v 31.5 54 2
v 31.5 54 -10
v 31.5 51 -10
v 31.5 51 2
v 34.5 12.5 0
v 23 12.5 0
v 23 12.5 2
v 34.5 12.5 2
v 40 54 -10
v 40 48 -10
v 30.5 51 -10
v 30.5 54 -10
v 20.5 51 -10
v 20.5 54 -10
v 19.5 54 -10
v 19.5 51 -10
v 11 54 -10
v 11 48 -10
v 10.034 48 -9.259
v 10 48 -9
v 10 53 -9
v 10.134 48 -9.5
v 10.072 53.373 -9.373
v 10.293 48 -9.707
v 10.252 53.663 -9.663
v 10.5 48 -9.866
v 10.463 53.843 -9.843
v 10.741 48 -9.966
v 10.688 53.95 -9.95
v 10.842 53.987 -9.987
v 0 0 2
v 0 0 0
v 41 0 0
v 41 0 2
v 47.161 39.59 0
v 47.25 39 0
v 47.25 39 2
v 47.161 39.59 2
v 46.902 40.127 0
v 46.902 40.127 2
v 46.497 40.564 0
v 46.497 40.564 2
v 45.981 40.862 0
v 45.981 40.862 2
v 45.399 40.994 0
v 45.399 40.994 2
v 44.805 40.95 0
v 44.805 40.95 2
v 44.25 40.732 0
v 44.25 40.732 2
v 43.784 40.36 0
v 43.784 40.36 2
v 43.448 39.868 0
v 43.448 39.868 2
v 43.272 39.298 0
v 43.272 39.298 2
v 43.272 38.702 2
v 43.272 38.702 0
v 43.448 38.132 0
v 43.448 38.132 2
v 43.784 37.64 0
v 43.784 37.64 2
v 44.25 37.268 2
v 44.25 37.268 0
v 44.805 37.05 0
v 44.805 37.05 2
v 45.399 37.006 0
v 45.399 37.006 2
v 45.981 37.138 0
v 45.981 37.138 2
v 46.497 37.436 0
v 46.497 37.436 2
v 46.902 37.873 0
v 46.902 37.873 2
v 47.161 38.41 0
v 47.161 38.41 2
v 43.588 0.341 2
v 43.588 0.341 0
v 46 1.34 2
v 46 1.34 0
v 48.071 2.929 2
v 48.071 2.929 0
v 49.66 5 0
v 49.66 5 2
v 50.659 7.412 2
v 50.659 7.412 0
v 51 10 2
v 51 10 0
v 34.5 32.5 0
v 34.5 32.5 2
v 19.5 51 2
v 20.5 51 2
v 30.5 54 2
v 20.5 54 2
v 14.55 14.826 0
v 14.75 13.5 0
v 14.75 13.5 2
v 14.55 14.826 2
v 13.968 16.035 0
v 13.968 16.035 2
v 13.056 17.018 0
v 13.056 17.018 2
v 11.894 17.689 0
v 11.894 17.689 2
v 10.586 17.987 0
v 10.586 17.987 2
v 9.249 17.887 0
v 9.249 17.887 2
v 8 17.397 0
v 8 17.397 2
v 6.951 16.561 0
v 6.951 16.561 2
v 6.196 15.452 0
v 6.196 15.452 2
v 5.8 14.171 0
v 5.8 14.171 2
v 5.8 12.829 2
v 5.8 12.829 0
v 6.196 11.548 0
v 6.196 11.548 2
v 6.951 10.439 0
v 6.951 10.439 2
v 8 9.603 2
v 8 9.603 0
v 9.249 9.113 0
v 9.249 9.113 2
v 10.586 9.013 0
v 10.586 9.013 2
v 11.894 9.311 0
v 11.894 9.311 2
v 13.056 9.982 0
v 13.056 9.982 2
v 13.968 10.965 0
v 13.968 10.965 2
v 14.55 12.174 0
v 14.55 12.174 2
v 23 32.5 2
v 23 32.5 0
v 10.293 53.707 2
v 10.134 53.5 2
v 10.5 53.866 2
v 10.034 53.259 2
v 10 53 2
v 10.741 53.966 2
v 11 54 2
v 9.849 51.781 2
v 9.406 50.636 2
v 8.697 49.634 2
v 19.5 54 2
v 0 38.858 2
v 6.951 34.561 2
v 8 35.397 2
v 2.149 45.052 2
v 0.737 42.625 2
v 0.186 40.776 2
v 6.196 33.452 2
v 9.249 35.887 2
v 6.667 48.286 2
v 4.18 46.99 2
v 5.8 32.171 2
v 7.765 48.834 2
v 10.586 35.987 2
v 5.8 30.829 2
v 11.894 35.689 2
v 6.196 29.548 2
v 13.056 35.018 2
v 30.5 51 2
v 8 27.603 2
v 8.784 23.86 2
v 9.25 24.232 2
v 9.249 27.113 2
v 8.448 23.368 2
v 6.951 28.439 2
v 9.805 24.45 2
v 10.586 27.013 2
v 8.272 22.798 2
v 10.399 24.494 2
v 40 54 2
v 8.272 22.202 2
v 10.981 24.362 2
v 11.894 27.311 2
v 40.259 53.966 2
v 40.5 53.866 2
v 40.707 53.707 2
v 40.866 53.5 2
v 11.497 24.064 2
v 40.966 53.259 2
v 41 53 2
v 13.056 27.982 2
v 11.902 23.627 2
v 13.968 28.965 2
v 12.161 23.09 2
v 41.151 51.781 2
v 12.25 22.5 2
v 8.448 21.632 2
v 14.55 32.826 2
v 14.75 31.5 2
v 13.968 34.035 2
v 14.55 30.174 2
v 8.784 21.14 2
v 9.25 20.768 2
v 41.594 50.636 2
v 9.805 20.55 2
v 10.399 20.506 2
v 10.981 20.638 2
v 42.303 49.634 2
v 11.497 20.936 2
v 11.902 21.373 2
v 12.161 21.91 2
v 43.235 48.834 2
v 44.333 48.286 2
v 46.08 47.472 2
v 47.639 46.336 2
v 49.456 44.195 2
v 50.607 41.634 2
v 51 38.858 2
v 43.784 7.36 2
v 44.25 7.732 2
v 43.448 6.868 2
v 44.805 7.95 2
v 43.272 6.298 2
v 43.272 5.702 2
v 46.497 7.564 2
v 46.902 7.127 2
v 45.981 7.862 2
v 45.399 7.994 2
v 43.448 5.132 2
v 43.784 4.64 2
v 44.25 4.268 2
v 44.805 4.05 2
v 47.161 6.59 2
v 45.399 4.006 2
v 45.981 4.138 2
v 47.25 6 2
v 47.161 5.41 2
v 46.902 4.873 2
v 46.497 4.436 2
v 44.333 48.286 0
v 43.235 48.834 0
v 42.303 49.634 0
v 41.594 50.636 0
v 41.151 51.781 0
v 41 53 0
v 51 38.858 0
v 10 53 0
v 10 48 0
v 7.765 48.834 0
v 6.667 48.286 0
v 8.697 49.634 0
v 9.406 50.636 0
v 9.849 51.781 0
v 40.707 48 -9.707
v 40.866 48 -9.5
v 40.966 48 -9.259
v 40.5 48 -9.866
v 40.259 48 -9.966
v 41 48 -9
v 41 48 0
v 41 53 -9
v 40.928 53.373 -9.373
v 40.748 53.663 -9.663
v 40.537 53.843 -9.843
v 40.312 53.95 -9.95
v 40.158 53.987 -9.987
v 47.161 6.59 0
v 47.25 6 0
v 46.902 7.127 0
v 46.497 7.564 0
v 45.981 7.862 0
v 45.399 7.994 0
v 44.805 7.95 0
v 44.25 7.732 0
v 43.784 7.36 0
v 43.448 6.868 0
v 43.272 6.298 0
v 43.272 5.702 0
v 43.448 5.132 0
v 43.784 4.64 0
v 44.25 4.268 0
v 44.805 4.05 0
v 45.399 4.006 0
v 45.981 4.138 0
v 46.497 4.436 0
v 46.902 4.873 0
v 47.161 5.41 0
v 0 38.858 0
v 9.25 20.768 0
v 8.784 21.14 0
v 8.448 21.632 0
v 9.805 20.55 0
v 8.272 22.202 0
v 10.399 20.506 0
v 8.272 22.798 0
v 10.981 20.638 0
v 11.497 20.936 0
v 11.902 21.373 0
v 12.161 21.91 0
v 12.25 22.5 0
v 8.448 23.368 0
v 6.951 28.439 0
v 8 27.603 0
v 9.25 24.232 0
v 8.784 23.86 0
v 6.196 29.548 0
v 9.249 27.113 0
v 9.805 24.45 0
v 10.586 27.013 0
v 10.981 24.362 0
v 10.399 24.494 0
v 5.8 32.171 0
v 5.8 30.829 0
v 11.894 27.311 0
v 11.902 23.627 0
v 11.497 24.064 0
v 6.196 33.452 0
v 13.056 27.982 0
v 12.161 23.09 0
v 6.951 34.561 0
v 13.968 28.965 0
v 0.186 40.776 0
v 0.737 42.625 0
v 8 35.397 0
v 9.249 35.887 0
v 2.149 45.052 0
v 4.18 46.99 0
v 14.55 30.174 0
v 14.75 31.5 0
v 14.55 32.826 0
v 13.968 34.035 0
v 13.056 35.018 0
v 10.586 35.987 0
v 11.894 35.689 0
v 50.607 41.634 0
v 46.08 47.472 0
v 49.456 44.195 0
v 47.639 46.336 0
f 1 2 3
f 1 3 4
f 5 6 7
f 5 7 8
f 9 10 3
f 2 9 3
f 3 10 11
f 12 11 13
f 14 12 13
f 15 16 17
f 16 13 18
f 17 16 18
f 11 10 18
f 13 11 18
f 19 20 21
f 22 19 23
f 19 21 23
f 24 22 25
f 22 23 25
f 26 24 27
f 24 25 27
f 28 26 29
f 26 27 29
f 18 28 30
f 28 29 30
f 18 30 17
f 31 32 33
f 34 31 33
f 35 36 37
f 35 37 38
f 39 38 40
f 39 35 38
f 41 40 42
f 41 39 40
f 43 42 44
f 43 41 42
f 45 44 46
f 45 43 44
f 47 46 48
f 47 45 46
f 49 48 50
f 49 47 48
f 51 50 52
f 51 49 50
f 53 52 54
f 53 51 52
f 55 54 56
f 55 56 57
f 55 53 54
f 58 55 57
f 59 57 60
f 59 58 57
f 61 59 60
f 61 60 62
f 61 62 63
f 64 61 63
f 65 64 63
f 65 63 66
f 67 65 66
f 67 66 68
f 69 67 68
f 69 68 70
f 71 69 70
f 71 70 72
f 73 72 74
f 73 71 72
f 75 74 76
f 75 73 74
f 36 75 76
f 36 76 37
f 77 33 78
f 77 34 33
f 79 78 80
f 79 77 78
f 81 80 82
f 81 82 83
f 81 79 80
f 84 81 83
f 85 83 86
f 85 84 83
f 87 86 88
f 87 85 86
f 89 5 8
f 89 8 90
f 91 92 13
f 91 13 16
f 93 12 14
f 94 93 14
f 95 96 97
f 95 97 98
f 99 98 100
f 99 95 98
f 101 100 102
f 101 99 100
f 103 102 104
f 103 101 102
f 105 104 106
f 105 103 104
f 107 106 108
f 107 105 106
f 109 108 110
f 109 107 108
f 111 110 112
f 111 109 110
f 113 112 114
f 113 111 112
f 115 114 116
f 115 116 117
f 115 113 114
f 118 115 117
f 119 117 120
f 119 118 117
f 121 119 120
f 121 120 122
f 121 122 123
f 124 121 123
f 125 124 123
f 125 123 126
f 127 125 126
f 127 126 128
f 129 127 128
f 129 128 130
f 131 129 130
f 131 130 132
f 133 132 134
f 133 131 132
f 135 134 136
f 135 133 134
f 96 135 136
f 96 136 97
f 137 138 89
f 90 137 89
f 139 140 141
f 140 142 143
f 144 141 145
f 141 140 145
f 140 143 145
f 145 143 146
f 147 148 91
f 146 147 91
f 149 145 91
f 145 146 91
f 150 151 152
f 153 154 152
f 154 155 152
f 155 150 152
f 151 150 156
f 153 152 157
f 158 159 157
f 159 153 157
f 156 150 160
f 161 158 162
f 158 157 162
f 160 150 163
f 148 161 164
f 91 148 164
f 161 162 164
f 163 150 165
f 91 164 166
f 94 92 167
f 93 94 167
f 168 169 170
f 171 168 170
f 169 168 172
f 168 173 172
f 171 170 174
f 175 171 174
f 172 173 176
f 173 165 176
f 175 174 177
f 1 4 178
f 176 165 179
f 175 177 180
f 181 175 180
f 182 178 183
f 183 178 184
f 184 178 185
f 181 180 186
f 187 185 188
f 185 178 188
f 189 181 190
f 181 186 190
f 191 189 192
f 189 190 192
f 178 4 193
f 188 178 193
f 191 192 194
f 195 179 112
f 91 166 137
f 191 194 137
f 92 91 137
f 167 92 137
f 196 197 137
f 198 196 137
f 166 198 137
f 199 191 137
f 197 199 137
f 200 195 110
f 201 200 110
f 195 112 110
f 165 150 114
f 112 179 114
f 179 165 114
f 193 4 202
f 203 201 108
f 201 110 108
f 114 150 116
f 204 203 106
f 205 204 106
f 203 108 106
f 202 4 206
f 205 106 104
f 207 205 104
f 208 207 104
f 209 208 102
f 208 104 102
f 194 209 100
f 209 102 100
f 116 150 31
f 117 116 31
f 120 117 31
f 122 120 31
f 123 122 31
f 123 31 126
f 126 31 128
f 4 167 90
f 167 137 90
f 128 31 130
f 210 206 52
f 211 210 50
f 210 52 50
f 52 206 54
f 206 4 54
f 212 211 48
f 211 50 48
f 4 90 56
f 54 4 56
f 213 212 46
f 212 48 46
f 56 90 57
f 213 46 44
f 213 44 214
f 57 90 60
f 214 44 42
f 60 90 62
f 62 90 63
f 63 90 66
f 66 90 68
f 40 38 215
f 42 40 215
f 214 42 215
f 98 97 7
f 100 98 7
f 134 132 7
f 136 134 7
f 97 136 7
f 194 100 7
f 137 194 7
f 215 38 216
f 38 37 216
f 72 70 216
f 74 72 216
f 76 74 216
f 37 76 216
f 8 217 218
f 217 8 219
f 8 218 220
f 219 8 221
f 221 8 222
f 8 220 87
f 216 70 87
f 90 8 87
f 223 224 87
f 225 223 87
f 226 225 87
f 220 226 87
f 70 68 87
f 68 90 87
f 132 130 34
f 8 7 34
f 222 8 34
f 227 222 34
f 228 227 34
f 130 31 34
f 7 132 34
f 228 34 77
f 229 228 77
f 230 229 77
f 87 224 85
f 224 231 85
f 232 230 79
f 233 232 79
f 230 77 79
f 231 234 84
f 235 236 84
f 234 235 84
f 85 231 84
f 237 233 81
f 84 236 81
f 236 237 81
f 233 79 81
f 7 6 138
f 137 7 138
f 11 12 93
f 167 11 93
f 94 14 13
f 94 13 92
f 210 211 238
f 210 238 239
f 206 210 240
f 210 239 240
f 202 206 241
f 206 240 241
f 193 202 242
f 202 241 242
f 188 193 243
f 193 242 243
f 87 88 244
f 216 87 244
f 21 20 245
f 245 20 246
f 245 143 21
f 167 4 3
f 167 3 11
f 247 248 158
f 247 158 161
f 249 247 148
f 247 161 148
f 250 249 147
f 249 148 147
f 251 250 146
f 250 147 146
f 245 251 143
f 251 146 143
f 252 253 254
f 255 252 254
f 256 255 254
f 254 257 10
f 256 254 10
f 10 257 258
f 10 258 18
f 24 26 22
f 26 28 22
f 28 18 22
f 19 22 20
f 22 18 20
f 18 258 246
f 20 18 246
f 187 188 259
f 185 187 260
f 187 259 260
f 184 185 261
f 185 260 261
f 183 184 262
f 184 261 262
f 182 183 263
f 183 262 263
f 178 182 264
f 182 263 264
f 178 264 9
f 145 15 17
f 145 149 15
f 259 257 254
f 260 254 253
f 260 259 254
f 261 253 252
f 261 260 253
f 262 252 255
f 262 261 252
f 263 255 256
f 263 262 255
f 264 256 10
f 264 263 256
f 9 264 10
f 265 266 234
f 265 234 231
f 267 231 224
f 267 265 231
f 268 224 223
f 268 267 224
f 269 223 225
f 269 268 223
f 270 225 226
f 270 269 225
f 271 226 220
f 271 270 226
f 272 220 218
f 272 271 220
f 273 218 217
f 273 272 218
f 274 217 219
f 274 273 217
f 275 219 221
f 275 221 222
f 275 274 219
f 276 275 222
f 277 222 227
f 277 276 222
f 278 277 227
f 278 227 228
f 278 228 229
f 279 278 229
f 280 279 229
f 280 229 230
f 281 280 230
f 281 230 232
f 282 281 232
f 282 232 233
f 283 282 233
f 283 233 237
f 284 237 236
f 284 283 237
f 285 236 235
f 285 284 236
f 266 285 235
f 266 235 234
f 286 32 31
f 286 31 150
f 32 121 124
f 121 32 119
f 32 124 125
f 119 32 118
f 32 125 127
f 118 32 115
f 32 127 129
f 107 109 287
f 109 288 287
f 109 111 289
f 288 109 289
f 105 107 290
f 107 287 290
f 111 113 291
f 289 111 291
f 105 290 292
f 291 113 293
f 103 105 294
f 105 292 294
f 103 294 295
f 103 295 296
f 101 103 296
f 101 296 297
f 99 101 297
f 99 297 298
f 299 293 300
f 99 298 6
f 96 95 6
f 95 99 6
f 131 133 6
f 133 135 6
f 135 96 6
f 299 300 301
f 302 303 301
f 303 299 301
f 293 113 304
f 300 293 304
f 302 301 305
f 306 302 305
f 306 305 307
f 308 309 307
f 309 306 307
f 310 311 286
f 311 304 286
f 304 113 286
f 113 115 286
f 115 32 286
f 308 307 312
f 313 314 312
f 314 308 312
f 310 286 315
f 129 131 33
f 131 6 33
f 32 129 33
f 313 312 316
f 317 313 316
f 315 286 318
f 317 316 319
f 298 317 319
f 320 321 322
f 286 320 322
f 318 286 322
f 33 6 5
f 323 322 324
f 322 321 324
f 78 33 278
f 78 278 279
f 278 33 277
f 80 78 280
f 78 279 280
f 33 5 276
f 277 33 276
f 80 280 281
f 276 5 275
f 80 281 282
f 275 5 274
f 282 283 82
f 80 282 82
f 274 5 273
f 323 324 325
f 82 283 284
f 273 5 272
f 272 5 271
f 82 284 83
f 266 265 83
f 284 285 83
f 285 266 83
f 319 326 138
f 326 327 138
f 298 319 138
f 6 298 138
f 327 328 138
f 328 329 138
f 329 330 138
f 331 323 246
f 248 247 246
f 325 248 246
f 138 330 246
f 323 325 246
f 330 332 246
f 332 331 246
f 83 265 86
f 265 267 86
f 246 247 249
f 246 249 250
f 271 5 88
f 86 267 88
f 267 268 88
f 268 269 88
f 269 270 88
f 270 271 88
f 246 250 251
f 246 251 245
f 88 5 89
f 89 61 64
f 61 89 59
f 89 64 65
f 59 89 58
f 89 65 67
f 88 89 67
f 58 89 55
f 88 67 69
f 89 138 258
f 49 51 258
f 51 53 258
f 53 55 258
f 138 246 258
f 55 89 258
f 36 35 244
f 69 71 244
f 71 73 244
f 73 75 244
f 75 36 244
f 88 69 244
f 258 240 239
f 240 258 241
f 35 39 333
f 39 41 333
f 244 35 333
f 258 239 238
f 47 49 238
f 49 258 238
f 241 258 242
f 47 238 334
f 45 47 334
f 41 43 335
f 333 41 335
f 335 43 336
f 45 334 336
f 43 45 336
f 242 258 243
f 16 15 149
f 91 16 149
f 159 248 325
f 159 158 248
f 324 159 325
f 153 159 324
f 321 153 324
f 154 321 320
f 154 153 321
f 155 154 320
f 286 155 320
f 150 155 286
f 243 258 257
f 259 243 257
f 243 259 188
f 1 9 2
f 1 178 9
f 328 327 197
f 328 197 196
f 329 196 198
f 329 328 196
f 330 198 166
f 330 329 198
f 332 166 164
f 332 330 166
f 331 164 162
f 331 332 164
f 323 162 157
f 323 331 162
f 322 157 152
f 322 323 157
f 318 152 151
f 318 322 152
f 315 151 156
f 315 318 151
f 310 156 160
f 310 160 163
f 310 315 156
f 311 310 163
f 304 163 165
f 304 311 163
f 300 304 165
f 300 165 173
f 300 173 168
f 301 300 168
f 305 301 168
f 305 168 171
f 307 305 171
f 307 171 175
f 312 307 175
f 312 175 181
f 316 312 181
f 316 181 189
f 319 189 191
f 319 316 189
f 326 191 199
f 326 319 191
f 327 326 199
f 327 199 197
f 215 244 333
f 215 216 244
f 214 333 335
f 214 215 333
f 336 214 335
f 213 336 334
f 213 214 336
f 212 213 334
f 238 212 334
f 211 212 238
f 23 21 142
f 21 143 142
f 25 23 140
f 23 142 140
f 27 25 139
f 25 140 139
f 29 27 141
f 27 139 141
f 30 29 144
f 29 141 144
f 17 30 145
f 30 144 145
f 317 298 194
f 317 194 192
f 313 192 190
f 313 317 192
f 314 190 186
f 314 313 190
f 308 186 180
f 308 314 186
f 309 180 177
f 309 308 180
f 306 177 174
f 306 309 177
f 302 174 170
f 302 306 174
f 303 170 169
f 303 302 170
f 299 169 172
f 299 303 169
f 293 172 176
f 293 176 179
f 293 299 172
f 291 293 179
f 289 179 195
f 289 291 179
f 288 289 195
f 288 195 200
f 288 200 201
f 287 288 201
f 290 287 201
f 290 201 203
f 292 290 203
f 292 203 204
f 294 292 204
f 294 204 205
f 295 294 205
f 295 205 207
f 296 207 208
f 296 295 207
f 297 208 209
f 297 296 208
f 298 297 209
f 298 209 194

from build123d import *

# Parameters (mm, degrees)
F0_W     = 51
F0_H     = 48
F0_R     = 4.5
F0_R_2   = 2
F0_W_2   = 11.5
F0_H_2   = 20
F1_DEPTH = 2
F3_DEPTH = 6
F4_W     = 1
F4_H     = 12
F5_DEPTH = 3
F6_R     = 5
F7_R     = 0.99999
F8_R     = 10


# Not quite as in the source:
# - a fillet or chamfer is up to 0.001 mm smaller than in the source, because OpenCascade refuses the exact size


with BuildPart() as f1:
    # F0 (on Top) → F1 (new body)
    with BuildSketch(Plane.XY):
        with Locations((25.5, 24)):
            Rectangle(F0_W, F0_H)
        with Locations((10.25, 13.5)):
            Circle(F0_R, mode=Mode.SUBTRACT)
        with Locations((10.25, 22.5)):
            Circle(F0_R_2, mode=Mode.SUBTRACT)
        with Locations((45.25, 6)):
            Circle(F0_R_2, mode=Mode.SUBTRACT)
        with Locations((28.75, 22.5)):
            Rectangle(F0_W_2, F0_H_2, mode=Mode.SUBTRACT)
        with Locations((10.25, 31.5)):
            Circle(F0_R, mode=Mode.SUBTRACT)
        with Locations((45.25, 39)):
            Circle(F0_R_2, mode=Mode.SUBTRACT)
    extrude(amount=F1_DEPTH)

    # F2 (on face) → F3 (join)
    with BuildSketch(Plane(origin=(0, 48, 0), x_dir=(-1, 0, 0), z_dir=(0, 1, 0))):
        Polygon((-10, 2), (-41, 2), (-41, 0), (-41, -10), (-10, -10), (-10, 0), align=None)
    extrude(amount=F3_DEPTH)

    # F4 (on face) → F5 (cut)
    with BuildSketch(Plane(origin=(0, 54, 0), x_dir=(-1, 0, 0), z_dir=(0, 1, 0))):
        with Locations((-20, -4)):
            Rectangle(F4_W, F4_H)
        with Locations((-31, -4)):
            Rectangle(F4_W, F4_H)
    extrude(amount=-F5_DEPTH, mode=Mode.SUBTRACT)

    # F6
    f6_edges = [f1.edges().sort_by_distance(p)[0] for p in [
        (10, 48, 1),
        (41, 48, 1),
    ]]
    fillet(f6_edges, radius=F6_R)

    # F7 (radius 1 in the source; OpenCascade refuses exactly that, so slightly less here)
    f7_edges = [f1.edges().sort_by_distance(p)[0] for p in [
        (41, 54, -4),
        (10, 54, -4),
        (10, 51, -10),
        (41, 51, -10),
    ]]
    fillet(f7_edges, radius=F7_R)

    # F8
    f8_edges = [f1.edges().sort_by_distance(p)[0] for p in [
        (51, 48, 1),
        (0, 48, 1),
        (51, 0, 1),
    ]]
    fillet(f8_edges, radius=F8_R)


solid = f1.part
